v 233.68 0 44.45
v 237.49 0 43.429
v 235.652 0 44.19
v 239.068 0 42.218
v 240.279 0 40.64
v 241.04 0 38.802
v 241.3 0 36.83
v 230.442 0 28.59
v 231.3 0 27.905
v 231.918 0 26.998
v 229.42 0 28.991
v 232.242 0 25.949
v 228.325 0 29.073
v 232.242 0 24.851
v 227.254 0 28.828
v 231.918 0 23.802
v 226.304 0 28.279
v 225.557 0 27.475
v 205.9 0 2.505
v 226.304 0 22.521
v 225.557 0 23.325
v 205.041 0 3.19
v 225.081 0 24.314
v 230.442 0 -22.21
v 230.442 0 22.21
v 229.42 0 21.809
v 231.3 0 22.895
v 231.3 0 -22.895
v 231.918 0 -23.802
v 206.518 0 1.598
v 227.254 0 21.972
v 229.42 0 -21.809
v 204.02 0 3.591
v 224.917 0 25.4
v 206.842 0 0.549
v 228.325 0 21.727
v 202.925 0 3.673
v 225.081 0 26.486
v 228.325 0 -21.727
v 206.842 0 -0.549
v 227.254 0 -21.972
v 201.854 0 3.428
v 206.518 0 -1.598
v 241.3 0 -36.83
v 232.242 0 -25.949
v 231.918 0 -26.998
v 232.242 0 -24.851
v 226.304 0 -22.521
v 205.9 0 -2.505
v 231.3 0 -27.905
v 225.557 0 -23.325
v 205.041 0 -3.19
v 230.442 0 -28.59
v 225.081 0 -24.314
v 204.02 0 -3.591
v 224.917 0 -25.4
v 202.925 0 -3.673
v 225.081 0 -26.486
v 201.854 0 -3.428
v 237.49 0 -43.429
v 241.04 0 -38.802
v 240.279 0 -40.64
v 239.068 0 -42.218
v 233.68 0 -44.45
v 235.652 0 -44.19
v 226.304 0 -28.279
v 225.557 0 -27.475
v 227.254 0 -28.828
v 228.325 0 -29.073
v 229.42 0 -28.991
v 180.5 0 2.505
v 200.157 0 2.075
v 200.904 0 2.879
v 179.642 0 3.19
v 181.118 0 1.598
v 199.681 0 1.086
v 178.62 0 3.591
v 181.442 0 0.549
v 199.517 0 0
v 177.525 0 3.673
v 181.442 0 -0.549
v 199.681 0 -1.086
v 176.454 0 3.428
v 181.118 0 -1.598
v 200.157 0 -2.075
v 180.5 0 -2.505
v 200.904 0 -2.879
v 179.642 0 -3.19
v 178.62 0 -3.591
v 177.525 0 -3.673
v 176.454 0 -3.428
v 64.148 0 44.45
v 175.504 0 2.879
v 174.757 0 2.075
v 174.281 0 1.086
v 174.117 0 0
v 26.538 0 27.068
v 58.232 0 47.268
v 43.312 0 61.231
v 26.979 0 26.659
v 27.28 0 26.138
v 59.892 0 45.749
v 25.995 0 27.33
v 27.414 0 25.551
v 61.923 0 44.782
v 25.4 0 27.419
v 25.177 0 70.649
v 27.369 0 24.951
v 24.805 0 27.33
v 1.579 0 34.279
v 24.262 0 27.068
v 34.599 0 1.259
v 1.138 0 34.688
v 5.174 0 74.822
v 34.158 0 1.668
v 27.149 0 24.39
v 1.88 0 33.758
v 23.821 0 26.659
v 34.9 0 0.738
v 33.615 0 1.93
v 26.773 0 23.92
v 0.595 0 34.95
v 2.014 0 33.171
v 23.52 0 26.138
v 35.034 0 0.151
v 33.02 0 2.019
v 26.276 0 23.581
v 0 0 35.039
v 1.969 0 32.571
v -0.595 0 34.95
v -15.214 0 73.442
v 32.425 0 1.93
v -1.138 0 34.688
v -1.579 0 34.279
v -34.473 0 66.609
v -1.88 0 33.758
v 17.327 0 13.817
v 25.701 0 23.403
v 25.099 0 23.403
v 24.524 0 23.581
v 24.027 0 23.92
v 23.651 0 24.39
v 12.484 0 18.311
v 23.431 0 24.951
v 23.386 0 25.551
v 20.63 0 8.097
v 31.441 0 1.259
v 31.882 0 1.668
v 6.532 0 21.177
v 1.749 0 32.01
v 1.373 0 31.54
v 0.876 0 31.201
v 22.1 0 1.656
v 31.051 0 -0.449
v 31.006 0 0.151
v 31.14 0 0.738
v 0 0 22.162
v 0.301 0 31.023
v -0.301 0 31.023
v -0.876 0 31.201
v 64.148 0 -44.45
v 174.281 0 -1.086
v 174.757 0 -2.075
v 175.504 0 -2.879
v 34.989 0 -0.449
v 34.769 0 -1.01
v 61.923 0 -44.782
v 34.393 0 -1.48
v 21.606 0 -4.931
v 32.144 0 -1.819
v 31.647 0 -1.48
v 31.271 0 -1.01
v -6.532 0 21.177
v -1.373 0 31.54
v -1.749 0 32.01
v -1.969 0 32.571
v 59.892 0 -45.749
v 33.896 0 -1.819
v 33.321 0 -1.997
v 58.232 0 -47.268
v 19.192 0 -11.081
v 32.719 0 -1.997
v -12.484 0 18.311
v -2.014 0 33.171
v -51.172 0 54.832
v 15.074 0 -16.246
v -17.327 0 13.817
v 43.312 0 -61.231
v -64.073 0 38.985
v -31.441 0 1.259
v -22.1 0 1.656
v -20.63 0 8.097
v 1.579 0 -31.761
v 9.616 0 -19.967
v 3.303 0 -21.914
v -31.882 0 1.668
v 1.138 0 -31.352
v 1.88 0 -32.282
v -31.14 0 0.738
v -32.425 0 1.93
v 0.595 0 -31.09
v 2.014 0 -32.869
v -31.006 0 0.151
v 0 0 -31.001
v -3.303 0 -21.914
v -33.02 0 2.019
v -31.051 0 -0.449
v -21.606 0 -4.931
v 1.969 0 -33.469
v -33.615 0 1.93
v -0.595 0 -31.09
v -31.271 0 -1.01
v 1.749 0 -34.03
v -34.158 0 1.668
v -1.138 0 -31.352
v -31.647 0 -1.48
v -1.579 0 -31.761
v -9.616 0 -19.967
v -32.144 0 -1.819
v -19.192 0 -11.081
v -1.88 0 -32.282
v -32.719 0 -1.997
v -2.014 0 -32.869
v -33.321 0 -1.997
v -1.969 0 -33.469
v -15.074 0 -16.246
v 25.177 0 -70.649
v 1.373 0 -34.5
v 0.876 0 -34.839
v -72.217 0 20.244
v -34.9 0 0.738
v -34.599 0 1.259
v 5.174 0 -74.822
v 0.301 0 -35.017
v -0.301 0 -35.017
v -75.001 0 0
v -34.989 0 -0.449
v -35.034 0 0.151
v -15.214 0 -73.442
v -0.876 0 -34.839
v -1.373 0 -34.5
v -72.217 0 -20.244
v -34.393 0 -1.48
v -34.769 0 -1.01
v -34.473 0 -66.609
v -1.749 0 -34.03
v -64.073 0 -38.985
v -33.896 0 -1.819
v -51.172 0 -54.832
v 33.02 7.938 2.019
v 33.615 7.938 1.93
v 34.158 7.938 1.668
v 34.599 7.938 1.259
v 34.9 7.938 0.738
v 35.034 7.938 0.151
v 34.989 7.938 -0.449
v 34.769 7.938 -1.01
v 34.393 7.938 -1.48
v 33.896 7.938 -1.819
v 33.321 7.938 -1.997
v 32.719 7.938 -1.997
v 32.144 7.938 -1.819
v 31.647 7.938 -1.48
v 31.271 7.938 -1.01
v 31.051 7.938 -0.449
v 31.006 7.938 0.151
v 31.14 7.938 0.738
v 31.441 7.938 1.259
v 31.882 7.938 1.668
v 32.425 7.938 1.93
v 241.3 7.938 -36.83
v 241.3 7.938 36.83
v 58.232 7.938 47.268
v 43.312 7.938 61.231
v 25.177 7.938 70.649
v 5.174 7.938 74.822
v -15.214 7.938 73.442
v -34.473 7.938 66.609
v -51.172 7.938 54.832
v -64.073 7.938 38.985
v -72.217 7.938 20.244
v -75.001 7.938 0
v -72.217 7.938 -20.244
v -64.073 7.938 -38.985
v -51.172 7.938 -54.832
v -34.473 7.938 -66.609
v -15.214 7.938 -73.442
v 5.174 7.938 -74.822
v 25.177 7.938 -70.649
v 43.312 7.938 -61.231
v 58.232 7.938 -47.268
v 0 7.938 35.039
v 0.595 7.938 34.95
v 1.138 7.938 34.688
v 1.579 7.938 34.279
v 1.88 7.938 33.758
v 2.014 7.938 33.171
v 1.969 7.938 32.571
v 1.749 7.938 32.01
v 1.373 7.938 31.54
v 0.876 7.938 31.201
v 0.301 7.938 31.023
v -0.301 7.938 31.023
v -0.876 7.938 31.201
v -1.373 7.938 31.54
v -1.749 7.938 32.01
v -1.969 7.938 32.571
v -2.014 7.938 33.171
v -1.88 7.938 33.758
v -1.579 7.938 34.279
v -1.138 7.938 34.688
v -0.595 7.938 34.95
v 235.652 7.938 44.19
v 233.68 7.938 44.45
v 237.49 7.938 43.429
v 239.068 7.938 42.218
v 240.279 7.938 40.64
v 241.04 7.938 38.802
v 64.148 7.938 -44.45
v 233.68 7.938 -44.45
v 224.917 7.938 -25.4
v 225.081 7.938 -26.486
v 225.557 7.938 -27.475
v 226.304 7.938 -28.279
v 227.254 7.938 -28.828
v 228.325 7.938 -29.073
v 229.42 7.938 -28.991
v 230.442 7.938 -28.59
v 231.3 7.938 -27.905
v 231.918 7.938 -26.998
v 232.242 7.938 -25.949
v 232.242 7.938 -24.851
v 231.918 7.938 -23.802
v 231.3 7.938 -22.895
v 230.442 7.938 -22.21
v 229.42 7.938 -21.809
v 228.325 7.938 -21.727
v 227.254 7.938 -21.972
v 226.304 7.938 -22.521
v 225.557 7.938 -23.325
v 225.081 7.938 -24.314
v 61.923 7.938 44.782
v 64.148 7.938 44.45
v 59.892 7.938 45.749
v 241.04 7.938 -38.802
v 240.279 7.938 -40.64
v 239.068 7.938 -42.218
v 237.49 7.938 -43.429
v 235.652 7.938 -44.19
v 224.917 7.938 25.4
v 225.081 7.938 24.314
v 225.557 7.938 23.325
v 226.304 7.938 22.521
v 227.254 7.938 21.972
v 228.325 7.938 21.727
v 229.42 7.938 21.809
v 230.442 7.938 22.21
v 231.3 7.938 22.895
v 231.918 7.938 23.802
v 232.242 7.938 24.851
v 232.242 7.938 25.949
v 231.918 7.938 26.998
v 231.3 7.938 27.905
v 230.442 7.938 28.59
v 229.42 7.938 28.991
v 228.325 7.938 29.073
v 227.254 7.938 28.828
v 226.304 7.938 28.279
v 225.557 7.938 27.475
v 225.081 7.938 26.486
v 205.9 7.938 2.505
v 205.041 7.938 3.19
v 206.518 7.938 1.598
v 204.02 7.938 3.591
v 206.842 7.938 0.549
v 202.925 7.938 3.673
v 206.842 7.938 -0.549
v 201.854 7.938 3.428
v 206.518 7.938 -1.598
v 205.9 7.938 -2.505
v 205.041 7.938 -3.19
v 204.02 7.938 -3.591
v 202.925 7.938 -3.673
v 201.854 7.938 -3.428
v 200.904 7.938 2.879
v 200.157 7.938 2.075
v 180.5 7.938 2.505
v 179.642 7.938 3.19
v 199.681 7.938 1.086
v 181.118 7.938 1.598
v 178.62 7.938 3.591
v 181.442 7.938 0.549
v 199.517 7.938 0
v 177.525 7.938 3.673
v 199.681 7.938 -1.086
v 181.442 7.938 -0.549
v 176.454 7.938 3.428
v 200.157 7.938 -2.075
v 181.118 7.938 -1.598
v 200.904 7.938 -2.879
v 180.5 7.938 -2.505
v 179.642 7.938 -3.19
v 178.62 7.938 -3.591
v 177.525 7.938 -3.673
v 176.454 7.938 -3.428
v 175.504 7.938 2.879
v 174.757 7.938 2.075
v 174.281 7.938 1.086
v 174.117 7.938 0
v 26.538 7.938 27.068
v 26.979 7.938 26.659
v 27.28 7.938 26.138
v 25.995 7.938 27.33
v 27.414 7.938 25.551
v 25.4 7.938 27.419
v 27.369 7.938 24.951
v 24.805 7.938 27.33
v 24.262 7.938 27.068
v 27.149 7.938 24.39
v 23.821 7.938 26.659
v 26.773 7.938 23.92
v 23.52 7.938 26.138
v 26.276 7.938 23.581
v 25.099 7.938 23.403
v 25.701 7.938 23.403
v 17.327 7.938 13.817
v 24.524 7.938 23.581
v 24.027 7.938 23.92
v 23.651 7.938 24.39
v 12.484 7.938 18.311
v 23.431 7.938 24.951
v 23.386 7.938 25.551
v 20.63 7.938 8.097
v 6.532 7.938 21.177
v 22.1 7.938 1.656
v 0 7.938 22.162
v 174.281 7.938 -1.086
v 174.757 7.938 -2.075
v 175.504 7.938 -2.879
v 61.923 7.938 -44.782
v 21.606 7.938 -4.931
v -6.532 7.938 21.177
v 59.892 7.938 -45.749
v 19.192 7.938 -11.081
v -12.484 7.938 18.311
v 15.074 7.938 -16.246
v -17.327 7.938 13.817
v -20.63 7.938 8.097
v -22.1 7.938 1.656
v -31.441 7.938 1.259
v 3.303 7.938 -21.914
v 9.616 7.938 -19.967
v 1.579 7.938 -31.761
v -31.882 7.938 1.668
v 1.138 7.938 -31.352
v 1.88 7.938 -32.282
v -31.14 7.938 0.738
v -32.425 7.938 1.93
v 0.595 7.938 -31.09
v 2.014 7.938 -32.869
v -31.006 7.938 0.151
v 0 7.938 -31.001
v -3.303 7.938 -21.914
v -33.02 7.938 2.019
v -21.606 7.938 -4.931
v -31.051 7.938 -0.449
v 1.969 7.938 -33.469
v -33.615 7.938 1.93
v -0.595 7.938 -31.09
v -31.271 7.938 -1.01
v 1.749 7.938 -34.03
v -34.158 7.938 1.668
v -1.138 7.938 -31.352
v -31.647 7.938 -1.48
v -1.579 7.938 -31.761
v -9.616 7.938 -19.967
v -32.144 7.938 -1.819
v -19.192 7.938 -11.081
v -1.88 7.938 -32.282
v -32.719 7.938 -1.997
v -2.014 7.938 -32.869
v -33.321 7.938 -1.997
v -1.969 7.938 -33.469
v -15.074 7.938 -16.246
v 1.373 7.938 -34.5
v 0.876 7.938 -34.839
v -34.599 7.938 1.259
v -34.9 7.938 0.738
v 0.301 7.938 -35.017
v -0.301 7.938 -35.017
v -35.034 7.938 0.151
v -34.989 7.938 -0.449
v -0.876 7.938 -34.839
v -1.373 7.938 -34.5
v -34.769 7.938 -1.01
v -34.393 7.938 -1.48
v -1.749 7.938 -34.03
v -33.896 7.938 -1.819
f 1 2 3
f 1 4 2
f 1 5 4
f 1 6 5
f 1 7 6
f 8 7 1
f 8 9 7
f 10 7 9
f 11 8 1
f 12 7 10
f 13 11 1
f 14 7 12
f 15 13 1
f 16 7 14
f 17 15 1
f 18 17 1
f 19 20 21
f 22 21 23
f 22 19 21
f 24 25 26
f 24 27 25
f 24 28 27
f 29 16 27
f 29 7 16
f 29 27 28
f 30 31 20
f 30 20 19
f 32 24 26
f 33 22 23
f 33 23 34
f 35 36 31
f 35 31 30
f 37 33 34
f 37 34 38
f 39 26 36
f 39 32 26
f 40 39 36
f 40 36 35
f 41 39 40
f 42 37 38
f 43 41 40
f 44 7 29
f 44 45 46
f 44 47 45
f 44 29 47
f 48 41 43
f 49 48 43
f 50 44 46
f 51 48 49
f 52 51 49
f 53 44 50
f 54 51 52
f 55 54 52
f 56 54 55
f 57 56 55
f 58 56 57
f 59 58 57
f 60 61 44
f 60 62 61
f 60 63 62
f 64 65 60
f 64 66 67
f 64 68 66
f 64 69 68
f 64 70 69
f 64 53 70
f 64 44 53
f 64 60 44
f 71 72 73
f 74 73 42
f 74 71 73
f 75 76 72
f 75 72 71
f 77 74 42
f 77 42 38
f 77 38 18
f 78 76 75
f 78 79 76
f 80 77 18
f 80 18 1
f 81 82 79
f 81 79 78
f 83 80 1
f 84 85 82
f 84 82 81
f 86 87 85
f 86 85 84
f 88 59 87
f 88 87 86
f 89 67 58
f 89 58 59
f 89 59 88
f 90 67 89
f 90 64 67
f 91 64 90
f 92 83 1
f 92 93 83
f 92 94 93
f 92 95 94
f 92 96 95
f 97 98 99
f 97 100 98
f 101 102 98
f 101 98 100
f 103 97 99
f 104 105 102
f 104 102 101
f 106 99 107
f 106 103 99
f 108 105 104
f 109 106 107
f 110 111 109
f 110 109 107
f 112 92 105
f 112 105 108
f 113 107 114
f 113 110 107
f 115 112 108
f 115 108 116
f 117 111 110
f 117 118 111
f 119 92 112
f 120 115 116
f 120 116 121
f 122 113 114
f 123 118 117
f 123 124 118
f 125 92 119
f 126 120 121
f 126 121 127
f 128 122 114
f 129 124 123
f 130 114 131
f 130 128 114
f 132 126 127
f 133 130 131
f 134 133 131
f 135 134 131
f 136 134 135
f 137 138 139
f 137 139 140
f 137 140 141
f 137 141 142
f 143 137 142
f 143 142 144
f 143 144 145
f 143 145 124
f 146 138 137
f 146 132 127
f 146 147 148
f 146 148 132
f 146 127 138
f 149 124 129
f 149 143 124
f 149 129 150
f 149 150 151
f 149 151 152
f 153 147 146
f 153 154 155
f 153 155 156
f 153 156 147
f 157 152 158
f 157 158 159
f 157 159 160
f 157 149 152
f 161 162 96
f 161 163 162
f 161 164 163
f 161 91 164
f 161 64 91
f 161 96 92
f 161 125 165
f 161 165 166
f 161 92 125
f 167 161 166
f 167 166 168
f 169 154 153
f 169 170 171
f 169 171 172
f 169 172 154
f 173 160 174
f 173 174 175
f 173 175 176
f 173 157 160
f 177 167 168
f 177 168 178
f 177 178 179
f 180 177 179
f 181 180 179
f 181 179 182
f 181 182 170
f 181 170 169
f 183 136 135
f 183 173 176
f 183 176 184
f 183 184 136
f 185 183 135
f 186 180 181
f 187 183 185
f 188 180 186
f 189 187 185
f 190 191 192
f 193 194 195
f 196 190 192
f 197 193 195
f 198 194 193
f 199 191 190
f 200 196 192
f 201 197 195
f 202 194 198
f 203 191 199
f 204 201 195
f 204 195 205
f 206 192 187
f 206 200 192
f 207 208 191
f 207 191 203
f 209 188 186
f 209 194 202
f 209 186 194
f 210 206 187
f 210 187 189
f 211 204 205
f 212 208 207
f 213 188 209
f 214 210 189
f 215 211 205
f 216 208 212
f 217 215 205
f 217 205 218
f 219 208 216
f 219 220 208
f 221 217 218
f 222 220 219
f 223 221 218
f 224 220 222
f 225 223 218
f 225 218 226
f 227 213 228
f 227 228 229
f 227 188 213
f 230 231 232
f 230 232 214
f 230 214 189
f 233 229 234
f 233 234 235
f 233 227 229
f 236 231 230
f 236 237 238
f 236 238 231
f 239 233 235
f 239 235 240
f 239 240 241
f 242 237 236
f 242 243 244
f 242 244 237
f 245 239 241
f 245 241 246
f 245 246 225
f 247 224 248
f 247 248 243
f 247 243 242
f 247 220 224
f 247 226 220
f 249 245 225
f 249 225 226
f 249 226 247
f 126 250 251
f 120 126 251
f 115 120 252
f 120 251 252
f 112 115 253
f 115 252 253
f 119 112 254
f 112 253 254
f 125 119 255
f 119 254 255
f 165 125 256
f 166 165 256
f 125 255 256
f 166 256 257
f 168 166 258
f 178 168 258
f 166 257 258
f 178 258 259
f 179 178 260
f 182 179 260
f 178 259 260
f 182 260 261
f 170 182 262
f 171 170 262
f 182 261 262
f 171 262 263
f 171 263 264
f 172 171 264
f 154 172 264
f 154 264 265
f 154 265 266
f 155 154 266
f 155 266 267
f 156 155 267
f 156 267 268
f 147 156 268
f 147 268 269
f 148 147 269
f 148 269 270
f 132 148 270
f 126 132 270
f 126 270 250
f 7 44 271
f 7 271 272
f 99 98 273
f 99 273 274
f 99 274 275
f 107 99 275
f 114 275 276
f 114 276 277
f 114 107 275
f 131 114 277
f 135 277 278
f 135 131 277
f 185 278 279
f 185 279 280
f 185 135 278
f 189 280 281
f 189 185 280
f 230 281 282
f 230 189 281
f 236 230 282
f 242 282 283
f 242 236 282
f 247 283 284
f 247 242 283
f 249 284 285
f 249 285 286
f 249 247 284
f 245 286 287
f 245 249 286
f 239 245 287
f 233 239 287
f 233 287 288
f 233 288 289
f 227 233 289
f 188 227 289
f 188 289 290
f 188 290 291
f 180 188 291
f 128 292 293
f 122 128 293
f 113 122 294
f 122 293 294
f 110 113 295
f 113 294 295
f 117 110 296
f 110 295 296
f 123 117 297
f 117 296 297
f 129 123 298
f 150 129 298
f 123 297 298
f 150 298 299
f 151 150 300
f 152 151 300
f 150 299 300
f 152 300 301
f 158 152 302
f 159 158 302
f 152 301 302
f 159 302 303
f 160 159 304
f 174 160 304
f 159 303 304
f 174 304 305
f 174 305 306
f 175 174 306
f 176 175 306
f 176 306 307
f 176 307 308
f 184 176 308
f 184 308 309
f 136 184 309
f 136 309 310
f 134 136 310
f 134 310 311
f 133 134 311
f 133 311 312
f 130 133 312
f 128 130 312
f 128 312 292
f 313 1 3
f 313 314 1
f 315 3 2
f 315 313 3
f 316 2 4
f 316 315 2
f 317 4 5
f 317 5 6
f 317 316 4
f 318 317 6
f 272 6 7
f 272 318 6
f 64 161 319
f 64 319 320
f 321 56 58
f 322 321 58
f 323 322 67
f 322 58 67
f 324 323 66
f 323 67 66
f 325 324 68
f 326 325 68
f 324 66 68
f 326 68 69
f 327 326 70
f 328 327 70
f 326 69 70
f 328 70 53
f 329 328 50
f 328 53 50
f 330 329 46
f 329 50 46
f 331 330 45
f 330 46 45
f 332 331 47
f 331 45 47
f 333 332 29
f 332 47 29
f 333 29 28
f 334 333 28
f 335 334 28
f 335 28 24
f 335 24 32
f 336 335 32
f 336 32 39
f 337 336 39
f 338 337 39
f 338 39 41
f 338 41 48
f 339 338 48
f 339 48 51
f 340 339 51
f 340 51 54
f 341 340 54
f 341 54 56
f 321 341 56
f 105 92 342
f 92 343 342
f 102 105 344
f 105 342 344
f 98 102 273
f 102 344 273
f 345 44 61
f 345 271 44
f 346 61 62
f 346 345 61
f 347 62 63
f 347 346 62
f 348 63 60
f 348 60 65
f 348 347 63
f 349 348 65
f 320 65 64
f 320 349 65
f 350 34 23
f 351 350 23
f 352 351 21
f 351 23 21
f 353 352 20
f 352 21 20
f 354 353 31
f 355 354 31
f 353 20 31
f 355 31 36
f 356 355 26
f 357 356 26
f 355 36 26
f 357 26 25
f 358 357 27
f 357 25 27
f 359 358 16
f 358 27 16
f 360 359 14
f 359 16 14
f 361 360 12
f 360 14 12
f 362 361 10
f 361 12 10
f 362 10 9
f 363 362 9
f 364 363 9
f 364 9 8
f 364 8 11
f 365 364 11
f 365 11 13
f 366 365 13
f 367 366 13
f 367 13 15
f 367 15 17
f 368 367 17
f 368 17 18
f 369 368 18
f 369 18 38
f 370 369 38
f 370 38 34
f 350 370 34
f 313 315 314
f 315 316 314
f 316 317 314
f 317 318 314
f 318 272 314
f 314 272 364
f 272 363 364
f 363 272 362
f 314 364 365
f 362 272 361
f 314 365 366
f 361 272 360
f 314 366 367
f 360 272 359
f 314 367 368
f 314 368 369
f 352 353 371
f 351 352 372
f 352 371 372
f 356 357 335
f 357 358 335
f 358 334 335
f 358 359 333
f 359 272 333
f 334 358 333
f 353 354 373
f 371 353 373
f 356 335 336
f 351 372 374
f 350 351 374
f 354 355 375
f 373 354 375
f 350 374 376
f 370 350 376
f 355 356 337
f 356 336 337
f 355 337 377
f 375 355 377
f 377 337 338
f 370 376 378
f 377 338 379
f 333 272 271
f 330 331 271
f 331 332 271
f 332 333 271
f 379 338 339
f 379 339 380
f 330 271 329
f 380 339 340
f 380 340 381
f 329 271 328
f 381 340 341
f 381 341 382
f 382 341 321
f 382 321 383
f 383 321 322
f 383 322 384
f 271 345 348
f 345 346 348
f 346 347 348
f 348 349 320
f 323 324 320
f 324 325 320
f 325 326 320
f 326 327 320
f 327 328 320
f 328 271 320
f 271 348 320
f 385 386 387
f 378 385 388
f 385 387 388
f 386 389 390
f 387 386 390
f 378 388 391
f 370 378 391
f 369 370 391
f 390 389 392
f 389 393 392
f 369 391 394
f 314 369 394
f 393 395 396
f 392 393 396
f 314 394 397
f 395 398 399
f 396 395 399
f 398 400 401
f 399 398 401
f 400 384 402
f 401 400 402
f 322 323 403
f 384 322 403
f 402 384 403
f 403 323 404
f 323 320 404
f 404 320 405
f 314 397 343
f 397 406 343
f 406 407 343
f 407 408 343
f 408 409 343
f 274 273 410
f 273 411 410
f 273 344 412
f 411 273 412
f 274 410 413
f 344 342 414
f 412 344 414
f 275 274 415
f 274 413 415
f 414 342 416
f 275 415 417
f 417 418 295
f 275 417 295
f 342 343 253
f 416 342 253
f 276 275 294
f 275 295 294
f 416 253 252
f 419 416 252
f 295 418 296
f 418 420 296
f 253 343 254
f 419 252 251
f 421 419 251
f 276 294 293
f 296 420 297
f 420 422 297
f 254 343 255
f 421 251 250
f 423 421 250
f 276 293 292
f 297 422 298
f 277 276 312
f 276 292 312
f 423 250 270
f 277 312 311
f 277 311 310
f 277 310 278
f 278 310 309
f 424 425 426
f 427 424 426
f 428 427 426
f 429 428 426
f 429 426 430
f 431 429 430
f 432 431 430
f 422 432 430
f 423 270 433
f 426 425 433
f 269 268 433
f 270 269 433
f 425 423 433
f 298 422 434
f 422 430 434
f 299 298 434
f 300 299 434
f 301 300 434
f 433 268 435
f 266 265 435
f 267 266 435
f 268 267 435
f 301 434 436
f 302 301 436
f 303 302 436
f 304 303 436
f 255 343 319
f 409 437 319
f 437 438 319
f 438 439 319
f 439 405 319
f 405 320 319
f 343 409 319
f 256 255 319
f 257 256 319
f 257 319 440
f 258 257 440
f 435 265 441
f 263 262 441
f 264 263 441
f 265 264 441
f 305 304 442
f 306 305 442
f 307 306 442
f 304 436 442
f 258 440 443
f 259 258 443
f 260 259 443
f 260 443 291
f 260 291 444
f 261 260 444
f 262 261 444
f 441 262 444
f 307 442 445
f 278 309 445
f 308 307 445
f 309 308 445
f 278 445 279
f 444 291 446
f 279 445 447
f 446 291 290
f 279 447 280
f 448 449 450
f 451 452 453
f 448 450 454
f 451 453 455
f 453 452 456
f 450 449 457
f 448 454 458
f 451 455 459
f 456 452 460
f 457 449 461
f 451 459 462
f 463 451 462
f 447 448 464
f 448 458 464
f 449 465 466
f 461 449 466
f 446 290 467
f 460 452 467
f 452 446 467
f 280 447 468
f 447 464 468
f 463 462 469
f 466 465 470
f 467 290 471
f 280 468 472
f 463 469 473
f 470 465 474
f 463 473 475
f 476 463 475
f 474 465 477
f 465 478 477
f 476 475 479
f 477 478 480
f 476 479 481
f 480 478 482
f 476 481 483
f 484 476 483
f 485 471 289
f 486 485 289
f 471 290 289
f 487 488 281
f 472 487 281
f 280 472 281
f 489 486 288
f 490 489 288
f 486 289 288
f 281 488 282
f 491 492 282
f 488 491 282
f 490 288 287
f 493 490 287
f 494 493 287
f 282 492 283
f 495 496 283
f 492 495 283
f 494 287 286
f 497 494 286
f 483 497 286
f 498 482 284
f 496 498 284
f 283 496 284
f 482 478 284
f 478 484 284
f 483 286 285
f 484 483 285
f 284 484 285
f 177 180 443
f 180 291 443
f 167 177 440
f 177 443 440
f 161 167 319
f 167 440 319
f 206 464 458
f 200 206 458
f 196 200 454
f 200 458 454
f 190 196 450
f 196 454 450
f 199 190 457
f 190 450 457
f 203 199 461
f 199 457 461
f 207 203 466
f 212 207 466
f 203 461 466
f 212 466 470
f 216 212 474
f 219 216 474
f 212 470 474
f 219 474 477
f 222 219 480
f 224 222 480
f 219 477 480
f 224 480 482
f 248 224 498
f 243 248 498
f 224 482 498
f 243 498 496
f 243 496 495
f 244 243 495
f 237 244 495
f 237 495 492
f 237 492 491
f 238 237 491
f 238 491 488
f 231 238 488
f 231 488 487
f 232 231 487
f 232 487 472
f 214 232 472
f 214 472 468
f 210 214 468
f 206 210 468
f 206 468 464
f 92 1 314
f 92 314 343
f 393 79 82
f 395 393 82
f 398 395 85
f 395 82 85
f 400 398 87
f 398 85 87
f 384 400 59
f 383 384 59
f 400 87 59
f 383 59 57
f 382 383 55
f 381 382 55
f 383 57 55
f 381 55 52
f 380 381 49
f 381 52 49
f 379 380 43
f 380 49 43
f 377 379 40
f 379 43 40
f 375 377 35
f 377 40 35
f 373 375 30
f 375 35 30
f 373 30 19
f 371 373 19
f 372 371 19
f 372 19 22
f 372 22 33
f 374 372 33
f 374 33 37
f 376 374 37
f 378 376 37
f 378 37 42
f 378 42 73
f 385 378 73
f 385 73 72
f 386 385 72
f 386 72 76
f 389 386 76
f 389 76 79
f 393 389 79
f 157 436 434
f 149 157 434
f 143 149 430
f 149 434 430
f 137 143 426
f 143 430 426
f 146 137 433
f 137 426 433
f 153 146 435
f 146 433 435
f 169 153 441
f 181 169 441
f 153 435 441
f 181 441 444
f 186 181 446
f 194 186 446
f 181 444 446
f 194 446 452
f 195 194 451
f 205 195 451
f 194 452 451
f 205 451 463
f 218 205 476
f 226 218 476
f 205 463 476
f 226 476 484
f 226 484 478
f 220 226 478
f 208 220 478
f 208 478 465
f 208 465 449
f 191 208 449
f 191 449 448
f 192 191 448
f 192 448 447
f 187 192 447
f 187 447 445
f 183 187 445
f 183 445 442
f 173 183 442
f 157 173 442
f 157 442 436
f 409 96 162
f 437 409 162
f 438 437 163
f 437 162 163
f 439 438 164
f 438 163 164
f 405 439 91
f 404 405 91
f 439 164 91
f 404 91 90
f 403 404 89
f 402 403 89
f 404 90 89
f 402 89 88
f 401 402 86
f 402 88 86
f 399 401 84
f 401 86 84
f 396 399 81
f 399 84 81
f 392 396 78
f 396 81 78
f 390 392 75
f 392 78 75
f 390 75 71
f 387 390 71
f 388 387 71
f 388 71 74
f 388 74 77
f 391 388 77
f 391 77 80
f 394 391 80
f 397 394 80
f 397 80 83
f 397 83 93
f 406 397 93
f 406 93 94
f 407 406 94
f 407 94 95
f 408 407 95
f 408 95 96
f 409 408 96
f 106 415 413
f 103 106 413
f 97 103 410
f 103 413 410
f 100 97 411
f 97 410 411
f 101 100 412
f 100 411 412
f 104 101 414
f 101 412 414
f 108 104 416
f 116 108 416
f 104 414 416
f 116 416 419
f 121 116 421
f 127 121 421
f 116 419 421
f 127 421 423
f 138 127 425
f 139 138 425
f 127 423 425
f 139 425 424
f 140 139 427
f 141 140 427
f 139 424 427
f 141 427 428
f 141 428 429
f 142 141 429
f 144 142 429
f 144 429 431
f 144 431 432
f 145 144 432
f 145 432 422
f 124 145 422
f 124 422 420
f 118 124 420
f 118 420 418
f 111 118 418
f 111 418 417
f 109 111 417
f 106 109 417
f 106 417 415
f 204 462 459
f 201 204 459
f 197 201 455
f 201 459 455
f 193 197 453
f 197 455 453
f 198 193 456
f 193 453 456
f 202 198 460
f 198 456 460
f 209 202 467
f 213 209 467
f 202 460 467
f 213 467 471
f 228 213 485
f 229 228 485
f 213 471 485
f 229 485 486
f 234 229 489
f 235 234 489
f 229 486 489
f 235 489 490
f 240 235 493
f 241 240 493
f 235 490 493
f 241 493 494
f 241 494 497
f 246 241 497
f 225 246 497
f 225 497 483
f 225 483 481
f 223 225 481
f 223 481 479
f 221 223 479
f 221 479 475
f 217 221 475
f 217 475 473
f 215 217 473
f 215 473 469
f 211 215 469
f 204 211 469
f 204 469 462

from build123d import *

# Parameters (mm, degrees)
BOSS_EXTRUDE1_DEPTH     = 7.9375
SKETCH21_R              = 22.1615
SKETCH21_R_2            = 2.0193
CUT_EXTRUDE2_DEPTH      = 253.811910138
FILLET1_R               = 7.62
L_0_29_DIAMETER_HOLE1_D = 7.366


with BuildPart() as part:
    # Sketch1 → Boss-Extrude1 (new body)
    with BuildSketch(Plane(origin=(0, 0, 0), x_dir=(1, 0, 0), z_dir=(0, 1, 0))):
        with BuildLine():
            Line((241.3, -44.45), (60.409978491, -44.45))
            ThreePointArc((60.409978491, -44.45), (-75.00112, 0), (60.409978491, 44.45))
            Line((60.409978491, 44.45), (241.3, 44.45))
            Line((241.3, 44.45), (241.3, -44.45))
        make_face()
    extrude(amount=BOSS_EXTRUDE1_DEPTH)

    # Sketch21 → Cut-Extrude2 (cut, through all)
    with BuildSketch(Plane(origin=(0, 7.9375, 0), x_dir=(1, 0, 0), z_dir=(0, 1, 0))):
        with Locations(Location((0, 0, 0), (0, 0, 270))):
            Circle(SKETCH21_R)
        with Locations(Location((0, 33.02, 0), (0, 0, 270))):
            Circle(SKETCH21_R_2)
        with Locations(Location((-33.02, 0, 0), (0, 0, 270))):
            Circle(SKETCH21_R_2)
        with Locations(Location((0, -33.02, 0), (0, 0, 270))):
            Circle(SKETCH21_R_2)
        with Locations(Location((33.02, 0, 0), (0, 0, 270))):
            Circle(SKETCH21_R_2)
        with Locations(Location((25.4, -25.4, 0), (0, 0, 270))):
            Circle(SKETCH21_R_2)
    extrude(amount=-CUT_EXTRUDE2_DEPTH, mode=Mode.SUBTRACT)

    # Fillet1
    fillet1_edges = [part.edges().sort_by_distance(p)[0] for p in [
        (60.409978491, 3.96875, -44.45),
        (241.3, 3.96875, -44.45),
        (241.3, 3.96875, 44.45),
        (60.409978491, 3.96875, 44.45),
    ]]
    fillet(fillet1_edges, radius=FILLET1_R)

    # L (0.29) Diameter Hole1 (through all)
    with Locations(Plane(origin=(0, 7.9375, 0), x_dir=(1, 0, 0), z_dir=(0, 1, 0))):
        with Locations((228.6, 25.4), (228.6, -25.4), (203.2, 0), (177.8, 0)):
            Hole(L_0_29_DIAMETER_HOLE1_D / 2)


solid = part.part
